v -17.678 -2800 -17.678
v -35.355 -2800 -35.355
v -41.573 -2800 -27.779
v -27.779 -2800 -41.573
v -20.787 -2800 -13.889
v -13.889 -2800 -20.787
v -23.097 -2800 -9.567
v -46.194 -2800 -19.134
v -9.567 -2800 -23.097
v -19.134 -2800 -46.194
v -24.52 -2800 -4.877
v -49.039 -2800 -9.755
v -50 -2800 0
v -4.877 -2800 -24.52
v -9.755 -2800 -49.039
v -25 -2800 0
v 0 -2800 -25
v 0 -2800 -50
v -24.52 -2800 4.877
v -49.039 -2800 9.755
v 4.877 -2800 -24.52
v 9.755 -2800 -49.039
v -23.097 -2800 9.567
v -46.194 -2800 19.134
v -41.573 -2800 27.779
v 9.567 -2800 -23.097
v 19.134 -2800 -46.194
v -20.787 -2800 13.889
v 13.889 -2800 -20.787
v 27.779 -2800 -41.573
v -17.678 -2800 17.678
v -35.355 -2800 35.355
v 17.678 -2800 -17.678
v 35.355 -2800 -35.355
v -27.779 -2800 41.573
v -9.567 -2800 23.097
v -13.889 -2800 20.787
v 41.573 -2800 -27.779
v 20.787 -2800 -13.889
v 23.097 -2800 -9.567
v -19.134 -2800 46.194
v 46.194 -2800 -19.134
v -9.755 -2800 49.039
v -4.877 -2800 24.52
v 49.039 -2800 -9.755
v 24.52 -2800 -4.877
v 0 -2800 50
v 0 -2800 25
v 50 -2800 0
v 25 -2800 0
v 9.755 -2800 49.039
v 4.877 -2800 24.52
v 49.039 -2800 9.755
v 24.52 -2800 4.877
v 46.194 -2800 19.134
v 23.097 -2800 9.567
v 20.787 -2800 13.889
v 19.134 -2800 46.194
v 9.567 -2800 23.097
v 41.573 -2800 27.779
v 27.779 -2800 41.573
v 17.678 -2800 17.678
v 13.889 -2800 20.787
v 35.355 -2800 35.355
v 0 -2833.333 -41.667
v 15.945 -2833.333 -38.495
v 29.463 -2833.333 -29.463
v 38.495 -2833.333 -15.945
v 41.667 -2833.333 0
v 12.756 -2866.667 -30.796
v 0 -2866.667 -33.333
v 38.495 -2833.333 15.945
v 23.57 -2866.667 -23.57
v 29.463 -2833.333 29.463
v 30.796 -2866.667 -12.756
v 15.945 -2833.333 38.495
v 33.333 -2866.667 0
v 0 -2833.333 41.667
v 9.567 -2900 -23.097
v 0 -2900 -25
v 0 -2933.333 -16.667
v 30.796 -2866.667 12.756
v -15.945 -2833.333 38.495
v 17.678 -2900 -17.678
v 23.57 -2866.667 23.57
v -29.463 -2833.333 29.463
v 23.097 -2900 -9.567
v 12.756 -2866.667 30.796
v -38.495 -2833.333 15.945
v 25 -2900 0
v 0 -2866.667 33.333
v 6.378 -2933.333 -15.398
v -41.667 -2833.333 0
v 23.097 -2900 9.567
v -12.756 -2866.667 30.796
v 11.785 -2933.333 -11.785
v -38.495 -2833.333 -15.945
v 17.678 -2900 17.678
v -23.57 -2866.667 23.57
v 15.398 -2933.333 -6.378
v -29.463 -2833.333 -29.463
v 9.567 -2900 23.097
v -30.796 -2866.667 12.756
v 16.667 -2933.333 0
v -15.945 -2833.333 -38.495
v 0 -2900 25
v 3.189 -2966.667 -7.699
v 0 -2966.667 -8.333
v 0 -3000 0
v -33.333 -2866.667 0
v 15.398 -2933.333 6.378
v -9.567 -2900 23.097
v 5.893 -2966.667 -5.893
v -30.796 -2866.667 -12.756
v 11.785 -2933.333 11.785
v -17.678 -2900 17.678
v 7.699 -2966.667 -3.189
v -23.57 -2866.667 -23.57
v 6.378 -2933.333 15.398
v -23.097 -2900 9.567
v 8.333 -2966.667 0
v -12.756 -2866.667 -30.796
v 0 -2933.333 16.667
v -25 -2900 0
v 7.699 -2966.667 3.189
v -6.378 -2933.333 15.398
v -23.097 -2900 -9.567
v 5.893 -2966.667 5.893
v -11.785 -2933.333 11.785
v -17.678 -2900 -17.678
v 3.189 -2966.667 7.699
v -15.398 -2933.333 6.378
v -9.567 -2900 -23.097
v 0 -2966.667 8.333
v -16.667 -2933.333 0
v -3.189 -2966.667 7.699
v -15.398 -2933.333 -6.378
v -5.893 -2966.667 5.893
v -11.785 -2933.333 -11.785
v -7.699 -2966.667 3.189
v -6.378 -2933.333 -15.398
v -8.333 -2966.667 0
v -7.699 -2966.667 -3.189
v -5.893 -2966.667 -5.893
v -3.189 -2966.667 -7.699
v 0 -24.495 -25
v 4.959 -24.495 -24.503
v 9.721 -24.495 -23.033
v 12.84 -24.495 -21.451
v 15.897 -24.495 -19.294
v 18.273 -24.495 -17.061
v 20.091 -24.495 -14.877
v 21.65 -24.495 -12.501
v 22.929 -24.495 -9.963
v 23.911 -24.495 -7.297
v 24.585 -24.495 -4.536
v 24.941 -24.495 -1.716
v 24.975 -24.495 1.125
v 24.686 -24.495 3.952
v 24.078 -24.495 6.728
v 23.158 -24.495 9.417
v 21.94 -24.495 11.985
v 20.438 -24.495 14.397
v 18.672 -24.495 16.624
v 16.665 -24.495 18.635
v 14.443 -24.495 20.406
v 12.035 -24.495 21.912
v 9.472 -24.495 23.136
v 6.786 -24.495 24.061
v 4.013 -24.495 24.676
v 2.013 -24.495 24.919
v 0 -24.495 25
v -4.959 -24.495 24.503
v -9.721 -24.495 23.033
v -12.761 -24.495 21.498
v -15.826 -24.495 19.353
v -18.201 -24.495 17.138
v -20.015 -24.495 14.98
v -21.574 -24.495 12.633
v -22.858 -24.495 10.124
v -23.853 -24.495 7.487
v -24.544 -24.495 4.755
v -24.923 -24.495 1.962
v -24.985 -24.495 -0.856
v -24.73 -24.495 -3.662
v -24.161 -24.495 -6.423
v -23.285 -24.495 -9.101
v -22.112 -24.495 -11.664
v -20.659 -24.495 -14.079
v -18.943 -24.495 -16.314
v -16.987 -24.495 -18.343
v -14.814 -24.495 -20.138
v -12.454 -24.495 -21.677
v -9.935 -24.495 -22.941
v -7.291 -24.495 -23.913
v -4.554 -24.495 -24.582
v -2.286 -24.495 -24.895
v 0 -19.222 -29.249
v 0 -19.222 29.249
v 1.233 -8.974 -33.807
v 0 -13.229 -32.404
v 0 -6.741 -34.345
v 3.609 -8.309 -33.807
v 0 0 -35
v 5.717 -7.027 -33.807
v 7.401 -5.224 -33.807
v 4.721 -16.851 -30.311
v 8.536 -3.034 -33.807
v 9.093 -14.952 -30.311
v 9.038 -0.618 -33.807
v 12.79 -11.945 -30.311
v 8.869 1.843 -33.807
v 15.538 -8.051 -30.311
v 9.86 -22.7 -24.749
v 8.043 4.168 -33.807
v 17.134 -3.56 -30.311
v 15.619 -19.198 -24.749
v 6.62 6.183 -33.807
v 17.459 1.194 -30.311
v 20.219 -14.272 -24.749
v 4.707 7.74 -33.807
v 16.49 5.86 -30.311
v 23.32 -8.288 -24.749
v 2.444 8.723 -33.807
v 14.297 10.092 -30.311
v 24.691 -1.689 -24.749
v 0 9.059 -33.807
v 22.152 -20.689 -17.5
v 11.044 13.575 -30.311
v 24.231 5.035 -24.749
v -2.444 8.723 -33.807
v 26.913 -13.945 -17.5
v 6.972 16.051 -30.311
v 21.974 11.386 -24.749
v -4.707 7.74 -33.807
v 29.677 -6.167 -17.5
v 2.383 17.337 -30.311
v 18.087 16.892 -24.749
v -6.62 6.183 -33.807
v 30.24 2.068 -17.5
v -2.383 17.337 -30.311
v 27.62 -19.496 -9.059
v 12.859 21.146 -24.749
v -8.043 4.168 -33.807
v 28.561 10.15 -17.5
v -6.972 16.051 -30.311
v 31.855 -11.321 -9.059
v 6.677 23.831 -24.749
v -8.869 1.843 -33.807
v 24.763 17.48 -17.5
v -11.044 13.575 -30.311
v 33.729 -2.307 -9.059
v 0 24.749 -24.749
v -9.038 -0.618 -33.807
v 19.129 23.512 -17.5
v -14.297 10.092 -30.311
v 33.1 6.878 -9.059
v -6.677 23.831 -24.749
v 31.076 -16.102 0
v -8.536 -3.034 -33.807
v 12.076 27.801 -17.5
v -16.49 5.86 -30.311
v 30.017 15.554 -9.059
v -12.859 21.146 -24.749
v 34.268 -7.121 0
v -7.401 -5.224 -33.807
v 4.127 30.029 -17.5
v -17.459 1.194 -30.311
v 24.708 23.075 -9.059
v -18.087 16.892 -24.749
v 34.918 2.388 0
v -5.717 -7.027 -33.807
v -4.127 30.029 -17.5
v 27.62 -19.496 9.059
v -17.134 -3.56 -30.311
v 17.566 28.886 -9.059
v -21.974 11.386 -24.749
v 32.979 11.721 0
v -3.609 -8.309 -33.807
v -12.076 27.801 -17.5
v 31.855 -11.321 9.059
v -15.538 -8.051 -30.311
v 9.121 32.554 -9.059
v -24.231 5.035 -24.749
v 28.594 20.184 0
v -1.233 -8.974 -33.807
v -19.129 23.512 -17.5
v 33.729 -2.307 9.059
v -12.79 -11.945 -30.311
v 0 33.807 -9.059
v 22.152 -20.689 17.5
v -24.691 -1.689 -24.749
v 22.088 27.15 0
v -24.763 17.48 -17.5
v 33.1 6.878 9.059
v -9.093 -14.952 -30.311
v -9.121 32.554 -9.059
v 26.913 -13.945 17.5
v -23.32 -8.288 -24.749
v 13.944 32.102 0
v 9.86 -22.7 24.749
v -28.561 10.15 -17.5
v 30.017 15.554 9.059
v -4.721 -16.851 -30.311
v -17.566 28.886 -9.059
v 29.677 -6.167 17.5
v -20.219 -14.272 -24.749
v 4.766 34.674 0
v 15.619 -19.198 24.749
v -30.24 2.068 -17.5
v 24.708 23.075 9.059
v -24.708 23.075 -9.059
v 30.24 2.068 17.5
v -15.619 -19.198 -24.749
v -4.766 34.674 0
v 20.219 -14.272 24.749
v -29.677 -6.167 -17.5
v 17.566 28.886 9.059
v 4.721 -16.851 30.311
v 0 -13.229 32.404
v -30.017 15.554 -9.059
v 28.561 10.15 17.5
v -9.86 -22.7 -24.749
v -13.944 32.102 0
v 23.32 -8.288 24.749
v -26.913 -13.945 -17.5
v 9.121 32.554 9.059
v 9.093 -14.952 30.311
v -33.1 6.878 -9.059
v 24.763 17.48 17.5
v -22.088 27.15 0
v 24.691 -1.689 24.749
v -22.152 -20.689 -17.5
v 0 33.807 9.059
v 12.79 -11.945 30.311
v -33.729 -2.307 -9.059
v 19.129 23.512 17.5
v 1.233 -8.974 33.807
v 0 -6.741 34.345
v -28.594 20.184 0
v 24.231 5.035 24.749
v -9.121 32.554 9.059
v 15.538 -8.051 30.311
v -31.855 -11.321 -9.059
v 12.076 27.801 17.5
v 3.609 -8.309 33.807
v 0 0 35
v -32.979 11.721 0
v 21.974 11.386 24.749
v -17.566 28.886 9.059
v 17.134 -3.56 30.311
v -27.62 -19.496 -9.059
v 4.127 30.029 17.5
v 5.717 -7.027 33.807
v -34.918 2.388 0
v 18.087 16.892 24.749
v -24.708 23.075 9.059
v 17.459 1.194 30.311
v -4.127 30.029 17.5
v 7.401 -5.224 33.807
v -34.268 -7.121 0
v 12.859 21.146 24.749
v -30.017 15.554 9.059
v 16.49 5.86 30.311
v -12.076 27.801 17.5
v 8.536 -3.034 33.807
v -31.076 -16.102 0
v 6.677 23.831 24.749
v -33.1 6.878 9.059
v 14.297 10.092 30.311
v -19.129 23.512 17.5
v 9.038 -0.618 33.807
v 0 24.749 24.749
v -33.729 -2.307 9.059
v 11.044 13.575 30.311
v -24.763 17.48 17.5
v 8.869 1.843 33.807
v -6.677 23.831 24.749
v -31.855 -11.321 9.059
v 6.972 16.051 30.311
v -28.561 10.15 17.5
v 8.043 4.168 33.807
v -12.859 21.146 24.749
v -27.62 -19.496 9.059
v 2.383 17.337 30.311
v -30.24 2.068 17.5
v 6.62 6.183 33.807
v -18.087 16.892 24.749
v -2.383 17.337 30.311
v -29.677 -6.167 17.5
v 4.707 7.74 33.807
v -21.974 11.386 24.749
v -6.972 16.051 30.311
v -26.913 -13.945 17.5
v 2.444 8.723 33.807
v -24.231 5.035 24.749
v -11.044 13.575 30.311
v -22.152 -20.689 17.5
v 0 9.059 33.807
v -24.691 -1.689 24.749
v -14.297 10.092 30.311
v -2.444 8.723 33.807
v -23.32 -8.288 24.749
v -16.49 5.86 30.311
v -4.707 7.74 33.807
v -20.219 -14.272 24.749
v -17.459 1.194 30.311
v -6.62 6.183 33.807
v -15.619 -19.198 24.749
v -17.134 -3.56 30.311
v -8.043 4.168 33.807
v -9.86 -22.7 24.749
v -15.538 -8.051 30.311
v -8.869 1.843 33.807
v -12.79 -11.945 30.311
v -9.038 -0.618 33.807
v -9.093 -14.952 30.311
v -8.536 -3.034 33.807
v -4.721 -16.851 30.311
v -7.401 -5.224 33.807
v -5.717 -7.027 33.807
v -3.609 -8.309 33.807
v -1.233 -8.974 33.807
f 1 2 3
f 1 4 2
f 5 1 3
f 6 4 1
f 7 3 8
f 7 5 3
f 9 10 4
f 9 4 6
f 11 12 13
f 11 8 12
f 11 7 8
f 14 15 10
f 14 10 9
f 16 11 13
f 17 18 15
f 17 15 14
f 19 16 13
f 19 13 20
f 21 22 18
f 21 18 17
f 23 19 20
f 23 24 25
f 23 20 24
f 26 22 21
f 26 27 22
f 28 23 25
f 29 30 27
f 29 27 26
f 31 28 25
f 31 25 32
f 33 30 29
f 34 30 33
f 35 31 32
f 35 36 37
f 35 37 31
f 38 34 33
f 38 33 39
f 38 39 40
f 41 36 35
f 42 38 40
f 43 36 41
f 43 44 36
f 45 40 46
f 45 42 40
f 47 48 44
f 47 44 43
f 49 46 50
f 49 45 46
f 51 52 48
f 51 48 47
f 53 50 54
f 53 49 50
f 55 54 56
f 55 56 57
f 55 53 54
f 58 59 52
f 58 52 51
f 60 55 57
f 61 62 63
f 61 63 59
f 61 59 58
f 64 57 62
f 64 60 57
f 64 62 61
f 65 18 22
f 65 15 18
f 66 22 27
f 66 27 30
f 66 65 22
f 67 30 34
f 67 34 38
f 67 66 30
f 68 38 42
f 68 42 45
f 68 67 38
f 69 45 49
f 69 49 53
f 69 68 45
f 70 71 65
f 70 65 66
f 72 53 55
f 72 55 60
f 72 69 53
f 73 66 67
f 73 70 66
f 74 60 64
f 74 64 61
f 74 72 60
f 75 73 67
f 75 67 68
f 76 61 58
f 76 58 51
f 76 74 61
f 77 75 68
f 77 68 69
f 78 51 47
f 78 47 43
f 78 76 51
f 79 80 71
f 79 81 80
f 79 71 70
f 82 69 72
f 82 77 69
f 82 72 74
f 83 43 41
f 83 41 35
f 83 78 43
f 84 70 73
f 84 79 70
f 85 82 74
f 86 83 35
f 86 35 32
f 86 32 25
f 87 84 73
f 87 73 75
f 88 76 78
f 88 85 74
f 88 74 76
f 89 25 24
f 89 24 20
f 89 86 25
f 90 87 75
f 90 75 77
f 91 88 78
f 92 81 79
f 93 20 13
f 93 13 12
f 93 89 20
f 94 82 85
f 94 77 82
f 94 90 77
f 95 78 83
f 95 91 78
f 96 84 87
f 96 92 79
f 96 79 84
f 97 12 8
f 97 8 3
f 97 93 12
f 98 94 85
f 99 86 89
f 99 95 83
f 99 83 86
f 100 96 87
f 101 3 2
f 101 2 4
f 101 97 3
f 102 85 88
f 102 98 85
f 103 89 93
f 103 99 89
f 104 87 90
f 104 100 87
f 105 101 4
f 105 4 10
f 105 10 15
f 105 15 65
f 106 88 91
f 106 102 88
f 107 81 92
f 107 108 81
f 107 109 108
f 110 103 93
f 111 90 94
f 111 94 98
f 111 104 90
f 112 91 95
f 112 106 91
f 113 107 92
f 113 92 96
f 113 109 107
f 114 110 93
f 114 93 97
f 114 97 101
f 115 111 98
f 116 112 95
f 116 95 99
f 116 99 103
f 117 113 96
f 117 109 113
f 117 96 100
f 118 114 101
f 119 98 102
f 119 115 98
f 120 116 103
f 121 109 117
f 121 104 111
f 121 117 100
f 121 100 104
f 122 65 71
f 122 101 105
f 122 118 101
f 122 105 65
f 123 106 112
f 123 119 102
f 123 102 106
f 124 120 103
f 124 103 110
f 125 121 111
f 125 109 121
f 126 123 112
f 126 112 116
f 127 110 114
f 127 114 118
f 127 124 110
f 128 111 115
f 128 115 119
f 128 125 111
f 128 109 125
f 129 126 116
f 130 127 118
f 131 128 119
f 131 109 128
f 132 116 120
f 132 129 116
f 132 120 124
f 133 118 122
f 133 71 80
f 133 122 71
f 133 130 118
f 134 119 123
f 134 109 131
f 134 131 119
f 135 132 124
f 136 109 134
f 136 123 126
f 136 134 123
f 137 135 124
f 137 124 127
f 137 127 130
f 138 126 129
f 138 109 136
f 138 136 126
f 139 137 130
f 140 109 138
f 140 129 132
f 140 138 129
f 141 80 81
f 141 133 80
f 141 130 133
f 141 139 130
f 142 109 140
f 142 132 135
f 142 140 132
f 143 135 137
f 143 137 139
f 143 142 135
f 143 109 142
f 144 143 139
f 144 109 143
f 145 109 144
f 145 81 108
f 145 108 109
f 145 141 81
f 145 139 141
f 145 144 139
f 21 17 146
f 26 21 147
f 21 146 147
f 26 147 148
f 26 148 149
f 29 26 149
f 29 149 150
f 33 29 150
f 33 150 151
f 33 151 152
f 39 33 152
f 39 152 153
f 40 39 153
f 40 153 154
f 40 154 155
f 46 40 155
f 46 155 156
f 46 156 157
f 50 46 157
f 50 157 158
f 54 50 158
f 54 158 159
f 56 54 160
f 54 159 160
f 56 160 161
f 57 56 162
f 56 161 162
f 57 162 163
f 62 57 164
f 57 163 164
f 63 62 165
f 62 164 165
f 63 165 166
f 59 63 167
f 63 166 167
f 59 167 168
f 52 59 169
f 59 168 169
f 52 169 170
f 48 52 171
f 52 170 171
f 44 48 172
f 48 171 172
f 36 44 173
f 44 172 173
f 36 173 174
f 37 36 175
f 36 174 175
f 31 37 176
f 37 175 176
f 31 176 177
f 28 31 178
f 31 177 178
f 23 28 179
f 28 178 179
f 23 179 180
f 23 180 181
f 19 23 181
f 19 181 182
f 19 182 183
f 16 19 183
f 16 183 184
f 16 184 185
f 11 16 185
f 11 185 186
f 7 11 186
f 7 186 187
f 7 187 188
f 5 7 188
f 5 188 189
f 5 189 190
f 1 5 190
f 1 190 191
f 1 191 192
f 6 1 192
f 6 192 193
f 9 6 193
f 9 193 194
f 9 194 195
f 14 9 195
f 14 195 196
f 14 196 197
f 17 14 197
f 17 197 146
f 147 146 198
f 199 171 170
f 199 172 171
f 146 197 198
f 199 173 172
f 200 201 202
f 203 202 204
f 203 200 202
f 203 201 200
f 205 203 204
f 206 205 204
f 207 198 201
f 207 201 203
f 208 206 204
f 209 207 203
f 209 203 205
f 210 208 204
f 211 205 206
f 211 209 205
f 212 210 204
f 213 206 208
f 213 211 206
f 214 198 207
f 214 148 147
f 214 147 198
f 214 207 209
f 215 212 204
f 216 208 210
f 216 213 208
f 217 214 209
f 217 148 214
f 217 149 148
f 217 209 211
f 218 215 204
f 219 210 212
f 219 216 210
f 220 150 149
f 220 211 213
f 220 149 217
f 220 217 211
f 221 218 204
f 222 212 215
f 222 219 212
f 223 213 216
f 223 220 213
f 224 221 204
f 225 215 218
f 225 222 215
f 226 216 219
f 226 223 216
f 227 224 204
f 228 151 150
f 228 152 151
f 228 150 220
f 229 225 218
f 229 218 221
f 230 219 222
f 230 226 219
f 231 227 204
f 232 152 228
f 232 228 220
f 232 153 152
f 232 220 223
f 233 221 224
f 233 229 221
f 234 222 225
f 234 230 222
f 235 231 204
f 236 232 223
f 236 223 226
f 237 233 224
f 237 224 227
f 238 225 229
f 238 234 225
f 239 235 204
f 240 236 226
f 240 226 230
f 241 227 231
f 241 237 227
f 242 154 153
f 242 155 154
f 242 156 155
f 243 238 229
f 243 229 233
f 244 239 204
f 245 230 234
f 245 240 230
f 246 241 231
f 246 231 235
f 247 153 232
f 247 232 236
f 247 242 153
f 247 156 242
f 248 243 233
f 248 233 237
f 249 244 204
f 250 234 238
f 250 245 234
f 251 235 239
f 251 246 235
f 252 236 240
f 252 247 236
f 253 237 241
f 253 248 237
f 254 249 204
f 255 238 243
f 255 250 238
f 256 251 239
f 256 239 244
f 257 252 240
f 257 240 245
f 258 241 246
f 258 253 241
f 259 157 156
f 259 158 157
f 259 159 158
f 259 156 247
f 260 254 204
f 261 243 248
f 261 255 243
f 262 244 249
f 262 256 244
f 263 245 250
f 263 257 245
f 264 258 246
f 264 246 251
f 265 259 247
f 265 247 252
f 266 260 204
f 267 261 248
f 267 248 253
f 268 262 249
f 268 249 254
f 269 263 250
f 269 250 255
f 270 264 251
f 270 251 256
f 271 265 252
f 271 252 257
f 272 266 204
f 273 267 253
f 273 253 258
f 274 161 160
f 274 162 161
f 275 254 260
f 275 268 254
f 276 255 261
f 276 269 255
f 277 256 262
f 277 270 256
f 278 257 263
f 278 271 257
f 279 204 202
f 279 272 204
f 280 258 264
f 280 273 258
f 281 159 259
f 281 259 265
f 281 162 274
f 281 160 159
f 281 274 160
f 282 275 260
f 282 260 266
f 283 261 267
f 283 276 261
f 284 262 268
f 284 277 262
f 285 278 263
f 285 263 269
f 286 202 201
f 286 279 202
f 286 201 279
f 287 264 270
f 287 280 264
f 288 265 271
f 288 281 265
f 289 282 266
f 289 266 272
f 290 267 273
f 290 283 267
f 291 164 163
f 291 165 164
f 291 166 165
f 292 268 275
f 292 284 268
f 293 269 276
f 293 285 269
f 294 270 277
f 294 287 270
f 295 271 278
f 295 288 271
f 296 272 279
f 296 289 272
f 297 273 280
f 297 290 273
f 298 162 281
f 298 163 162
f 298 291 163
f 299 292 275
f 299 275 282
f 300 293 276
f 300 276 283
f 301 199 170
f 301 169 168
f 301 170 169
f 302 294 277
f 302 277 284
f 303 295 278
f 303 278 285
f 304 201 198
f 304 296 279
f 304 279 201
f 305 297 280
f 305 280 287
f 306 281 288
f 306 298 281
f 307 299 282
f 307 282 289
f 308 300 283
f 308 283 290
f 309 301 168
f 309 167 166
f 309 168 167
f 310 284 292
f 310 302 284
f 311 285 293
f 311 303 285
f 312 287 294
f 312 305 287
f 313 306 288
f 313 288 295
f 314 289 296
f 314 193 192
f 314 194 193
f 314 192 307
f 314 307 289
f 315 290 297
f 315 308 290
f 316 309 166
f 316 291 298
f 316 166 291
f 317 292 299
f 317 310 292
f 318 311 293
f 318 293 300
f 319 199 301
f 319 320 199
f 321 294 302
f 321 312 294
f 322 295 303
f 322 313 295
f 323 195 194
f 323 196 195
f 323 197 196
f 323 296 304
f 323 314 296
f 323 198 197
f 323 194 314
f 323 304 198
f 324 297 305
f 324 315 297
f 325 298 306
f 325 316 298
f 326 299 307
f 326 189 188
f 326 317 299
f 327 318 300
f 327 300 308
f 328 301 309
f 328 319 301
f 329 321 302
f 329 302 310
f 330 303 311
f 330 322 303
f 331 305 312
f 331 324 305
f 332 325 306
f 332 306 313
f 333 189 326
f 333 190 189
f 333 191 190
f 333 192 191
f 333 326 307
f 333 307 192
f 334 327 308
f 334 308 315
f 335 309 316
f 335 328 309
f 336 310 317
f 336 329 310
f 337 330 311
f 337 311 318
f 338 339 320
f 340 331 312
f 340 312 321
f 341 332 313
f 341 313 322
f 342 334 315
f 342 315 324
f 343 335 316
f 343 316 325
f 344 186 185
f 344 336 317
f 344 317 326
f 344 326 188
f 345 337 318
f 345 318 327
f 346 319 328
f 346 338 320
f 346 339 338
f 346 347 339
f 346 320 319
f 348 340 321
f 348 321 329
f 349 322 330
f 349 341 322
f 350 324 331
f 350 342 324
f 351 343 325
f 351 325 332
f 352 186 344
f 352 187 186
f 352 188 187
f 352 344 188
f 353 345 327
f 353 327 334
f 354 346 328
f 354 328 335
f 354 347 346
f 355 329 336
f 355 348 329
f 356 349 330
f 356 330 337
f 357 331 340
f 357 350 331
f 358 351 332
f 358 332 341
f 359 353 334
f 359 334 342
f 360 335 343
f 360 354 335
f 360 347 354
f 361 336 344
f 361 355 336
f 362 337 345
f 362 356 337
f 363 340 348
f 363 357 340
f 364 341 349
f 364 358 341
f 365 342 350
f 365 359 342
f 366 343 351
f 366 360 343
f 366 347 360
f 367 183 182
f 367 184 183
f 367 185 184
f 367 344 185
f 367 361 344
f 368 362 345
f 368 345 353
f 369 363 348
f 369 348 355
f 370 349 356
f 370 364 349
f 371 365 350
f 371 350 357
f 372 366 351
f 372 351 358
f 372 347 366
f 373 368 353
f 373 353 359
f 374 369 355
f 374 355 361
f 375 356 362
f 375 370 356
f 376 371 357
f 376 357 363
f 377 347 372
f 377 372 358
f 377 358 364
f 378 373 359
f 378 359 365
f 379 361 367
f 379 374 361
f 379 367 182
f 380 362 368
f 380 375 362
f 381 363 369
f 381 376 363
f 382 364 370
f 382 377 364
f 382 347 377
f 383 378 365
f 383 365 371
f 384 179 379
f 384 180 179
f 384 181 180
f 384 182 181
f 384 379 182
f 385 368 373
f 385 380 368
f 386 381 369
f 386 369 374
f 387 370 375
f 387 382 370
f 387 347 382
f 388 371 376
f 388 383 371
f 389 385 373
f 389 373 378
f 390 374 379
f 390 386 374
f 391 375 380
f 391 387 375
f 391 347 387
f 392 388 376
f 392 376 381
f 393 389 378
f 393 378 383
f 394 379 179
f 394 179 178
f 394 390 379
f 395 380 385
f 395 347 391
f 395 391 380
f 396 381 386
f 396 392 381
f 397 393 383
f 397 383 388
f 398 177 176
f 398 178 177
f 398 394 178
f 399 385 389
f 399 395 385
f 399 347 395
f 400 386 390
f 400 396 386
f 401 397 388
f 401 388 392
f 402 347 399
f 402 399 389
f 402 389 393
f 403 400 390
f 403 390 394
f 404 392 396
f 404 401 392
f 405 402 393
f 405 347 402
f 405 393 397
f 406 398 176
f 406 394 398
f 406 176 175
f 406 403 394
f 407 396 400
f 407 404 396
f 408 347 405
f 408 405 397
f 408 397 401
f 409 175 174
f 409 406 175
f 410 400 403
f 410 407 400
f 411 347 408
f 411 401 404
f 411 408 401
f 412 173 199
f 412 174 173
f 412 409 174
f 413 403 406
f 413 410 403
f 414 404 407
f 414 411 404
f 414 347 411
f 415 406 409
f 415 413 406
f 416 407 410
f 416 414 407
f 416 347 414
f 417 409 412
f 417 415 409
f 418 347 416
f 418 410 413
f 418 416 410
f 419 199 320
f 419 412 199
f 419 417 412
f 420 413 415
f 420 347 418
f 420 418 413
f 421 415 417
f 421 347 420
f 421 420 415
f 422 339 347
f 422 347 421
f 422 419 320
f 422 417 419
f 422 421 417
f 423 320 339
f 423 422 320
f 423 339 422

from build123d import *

# Parameters (mm, degrees)
CYLINDER002_R             = 25
CYLINDER002_DEPTH         = 2800
FUSION002_PLACEMENT_ANGLE = 90


with BuildPart() as sphere002:
    # Sphere002 → Sphere002 (revolve)
    with BuildSketch(Plane.XZ):
        with BuildLine():
            ThreePointArc((0, -35), (35, 0), (0, 35))
            Line((0, 35), (0, -35))
        make_face()
    revolve(axis=Axis((0, 0, 0), (0, 0, 1)))


with BuildPart() as cone002:
    # Cone002 → Cone002 (revolve)
    with BuildSketch(Plane(origin=(2800, 0, 0), x_dir=(0, 0, -1), z_dir=(0, -1, 0))):
        Polygon((0, 0), (50, 0), (0, 200), align=None)
    revolve(axis=Axis((2800, 0, 0), (1, 0, 0)))


with BuildPart() as long:
    # Cylinder002 → Cylinder002 (new body)
    with BuildSketch(Plane(origin=(0, 0, 0), x_dir=(0, 0, -1), z_dir=(1, 0, 0))):
        Circle(CYLINDER002_R)
    extrude(amount=CYLINDER002_DEPTH)

    # Fusion002: union Sphere002, Cone002
    add(sphere002.part)
    add(cone002.part)


with BuildPart() as long_1:
    # Fusion002 placement: moved
    add(long.part.rotate(Axis((0, 0, 0), (0, 0, -1)), FUSION002_PLACEMENT_ANGLE))


solid = long_1.part
